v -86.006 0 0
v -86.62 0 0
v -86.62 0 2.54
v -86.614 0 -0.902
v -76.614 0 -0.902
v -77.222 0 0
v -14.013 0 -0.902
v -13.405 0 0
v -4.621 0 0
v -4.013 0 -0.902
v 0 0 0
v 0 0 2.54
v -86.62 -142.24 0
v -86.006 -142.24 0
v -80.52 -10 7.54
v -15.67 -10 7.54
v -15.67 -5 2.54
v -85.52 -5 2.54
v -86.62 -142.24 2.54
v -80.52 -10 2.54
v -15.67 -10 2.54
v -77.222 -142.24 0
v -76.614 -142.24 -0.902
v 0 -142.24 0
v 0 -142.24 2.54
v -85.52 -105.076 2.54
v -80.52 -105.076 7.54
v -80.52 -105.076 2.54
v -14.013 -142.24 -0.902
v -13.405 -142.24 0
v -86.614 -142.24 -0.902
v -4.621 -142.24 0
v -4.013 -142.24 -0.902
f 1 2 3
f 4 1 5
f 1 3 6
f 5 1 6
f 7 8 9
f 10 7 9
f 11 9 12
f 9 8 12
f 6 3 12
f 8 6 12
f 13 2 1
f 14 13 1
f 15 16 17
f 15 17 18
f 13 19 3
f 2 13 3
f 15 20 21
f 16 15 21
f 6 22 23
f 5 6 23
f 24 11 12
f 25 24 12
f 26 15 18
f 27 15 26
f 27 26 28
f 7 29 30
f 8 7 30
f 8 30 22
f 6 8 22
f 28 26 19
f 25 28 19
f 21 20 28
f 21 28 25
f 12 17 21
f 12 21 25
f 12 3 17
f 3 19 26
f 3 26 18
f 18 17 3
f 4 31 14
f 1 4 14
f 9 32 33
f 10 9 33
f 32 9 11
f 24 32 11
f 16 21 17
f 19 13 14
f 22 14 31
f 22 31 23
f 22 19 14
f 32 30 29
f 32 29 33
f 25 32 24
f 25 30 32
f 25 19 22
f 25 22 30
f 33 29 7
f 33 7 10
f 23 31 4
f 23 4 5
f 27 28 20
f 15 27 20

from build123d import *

# Parameters (mm, degrees)
F0_W      = 96.52
F0_H      = 2.54
F1_DEPTH  = 142.24
F2_W      = 10
F2_H      = 142.24
F3_DEPTH  = 0.9017
F5_DEPTH  = 142.241
F8_DEPTH  = 5
F9_SIZE   = 4.99999
F10_W     = 9.9
F10_H     = 142.24
F11_DEPTH = 3.4427


# Not quite as in the source:
# - a fillet or chamfer is up to 0.001 mm smaller than in the source, because OpenCascade refuses the exact size


with BuildPart() as f1:
    # F0 (on Front) → F1 (new body)
    with BuildSketch(Plane.XZ):
        with Locations((-48.26, 1.27)):
            Rectangle(F0_W, F0_H)
    extrude(amount=F1_DEPTH)

    # F2 (on face) → F3 (join)
    with BuildSketch(Plane(origin=(0, 0, 0), x_dir=(1, 0, 0), z_dir=(0, 0, -1))):
        with Locations((-81.614, 71.12)):
            Rectangle(F2_W, F2_H)
        with Locations((-9.0132, 71.12)):
            Rectangle(F2_W, F2_H)
    extrude(amount=F3_DEPTH)

    # F4 (on face) → F5 (cut, through all)
    with BuildSketch(Plane.XZ.offset(142.24)):
        Polygon((-86.614, 0), (-86.614, -0.9017), (-86.0057956704, 0), align=None)
        Polygon((-77.2222043296, 0), (-76.614, -0.9017), (-76.614, 0), align=None)
        Polygon((-14.0132, 0), (-14.0132, -0.9017), (-13.4049956704, 0), align=None)
        Polygon((-4.6214043296, 0), (-4.0132, -0.9017), (-4.0132, 0), align=None)
    extrude(amount=-F5_DEPTH, mode=Mode.SUBTRACT)

    # F7 (on face) → F8 (join)
    with BuildSketch(Plane.XY.offset(2.54)):
        Polygon((-15.67, -5), (-85.52, -5), (-85.52, -105.076), (-80.52, -105.076), (-80.52, -10), (-15.67, -10), align=None)
    extrude(amount=F8_DEPTH)

    # F9 (size 5 in the source; OpenCascade refuses exactly that, so slightly less here)
    f9_edges = [f1.edges().sort_by_distance(p)[0] for p in [
        (-85.52, -55.038, 7.54),
        (-50.595, -5, 7.54),
    ]]
    chamfer(f9_edges, length=F9_SIZE)

    # F10 (on face) → F11 (cut, through all)
    with BuildSketch(Plane.XY.offset(2.54)):
        with Locations((-91.57, -71.12)):
            Rectangle(F10_W, F10_H)
    extrude(amount=-F11_DEPTH, mode=Mode.SUBTRACT)


solid = f1.part
